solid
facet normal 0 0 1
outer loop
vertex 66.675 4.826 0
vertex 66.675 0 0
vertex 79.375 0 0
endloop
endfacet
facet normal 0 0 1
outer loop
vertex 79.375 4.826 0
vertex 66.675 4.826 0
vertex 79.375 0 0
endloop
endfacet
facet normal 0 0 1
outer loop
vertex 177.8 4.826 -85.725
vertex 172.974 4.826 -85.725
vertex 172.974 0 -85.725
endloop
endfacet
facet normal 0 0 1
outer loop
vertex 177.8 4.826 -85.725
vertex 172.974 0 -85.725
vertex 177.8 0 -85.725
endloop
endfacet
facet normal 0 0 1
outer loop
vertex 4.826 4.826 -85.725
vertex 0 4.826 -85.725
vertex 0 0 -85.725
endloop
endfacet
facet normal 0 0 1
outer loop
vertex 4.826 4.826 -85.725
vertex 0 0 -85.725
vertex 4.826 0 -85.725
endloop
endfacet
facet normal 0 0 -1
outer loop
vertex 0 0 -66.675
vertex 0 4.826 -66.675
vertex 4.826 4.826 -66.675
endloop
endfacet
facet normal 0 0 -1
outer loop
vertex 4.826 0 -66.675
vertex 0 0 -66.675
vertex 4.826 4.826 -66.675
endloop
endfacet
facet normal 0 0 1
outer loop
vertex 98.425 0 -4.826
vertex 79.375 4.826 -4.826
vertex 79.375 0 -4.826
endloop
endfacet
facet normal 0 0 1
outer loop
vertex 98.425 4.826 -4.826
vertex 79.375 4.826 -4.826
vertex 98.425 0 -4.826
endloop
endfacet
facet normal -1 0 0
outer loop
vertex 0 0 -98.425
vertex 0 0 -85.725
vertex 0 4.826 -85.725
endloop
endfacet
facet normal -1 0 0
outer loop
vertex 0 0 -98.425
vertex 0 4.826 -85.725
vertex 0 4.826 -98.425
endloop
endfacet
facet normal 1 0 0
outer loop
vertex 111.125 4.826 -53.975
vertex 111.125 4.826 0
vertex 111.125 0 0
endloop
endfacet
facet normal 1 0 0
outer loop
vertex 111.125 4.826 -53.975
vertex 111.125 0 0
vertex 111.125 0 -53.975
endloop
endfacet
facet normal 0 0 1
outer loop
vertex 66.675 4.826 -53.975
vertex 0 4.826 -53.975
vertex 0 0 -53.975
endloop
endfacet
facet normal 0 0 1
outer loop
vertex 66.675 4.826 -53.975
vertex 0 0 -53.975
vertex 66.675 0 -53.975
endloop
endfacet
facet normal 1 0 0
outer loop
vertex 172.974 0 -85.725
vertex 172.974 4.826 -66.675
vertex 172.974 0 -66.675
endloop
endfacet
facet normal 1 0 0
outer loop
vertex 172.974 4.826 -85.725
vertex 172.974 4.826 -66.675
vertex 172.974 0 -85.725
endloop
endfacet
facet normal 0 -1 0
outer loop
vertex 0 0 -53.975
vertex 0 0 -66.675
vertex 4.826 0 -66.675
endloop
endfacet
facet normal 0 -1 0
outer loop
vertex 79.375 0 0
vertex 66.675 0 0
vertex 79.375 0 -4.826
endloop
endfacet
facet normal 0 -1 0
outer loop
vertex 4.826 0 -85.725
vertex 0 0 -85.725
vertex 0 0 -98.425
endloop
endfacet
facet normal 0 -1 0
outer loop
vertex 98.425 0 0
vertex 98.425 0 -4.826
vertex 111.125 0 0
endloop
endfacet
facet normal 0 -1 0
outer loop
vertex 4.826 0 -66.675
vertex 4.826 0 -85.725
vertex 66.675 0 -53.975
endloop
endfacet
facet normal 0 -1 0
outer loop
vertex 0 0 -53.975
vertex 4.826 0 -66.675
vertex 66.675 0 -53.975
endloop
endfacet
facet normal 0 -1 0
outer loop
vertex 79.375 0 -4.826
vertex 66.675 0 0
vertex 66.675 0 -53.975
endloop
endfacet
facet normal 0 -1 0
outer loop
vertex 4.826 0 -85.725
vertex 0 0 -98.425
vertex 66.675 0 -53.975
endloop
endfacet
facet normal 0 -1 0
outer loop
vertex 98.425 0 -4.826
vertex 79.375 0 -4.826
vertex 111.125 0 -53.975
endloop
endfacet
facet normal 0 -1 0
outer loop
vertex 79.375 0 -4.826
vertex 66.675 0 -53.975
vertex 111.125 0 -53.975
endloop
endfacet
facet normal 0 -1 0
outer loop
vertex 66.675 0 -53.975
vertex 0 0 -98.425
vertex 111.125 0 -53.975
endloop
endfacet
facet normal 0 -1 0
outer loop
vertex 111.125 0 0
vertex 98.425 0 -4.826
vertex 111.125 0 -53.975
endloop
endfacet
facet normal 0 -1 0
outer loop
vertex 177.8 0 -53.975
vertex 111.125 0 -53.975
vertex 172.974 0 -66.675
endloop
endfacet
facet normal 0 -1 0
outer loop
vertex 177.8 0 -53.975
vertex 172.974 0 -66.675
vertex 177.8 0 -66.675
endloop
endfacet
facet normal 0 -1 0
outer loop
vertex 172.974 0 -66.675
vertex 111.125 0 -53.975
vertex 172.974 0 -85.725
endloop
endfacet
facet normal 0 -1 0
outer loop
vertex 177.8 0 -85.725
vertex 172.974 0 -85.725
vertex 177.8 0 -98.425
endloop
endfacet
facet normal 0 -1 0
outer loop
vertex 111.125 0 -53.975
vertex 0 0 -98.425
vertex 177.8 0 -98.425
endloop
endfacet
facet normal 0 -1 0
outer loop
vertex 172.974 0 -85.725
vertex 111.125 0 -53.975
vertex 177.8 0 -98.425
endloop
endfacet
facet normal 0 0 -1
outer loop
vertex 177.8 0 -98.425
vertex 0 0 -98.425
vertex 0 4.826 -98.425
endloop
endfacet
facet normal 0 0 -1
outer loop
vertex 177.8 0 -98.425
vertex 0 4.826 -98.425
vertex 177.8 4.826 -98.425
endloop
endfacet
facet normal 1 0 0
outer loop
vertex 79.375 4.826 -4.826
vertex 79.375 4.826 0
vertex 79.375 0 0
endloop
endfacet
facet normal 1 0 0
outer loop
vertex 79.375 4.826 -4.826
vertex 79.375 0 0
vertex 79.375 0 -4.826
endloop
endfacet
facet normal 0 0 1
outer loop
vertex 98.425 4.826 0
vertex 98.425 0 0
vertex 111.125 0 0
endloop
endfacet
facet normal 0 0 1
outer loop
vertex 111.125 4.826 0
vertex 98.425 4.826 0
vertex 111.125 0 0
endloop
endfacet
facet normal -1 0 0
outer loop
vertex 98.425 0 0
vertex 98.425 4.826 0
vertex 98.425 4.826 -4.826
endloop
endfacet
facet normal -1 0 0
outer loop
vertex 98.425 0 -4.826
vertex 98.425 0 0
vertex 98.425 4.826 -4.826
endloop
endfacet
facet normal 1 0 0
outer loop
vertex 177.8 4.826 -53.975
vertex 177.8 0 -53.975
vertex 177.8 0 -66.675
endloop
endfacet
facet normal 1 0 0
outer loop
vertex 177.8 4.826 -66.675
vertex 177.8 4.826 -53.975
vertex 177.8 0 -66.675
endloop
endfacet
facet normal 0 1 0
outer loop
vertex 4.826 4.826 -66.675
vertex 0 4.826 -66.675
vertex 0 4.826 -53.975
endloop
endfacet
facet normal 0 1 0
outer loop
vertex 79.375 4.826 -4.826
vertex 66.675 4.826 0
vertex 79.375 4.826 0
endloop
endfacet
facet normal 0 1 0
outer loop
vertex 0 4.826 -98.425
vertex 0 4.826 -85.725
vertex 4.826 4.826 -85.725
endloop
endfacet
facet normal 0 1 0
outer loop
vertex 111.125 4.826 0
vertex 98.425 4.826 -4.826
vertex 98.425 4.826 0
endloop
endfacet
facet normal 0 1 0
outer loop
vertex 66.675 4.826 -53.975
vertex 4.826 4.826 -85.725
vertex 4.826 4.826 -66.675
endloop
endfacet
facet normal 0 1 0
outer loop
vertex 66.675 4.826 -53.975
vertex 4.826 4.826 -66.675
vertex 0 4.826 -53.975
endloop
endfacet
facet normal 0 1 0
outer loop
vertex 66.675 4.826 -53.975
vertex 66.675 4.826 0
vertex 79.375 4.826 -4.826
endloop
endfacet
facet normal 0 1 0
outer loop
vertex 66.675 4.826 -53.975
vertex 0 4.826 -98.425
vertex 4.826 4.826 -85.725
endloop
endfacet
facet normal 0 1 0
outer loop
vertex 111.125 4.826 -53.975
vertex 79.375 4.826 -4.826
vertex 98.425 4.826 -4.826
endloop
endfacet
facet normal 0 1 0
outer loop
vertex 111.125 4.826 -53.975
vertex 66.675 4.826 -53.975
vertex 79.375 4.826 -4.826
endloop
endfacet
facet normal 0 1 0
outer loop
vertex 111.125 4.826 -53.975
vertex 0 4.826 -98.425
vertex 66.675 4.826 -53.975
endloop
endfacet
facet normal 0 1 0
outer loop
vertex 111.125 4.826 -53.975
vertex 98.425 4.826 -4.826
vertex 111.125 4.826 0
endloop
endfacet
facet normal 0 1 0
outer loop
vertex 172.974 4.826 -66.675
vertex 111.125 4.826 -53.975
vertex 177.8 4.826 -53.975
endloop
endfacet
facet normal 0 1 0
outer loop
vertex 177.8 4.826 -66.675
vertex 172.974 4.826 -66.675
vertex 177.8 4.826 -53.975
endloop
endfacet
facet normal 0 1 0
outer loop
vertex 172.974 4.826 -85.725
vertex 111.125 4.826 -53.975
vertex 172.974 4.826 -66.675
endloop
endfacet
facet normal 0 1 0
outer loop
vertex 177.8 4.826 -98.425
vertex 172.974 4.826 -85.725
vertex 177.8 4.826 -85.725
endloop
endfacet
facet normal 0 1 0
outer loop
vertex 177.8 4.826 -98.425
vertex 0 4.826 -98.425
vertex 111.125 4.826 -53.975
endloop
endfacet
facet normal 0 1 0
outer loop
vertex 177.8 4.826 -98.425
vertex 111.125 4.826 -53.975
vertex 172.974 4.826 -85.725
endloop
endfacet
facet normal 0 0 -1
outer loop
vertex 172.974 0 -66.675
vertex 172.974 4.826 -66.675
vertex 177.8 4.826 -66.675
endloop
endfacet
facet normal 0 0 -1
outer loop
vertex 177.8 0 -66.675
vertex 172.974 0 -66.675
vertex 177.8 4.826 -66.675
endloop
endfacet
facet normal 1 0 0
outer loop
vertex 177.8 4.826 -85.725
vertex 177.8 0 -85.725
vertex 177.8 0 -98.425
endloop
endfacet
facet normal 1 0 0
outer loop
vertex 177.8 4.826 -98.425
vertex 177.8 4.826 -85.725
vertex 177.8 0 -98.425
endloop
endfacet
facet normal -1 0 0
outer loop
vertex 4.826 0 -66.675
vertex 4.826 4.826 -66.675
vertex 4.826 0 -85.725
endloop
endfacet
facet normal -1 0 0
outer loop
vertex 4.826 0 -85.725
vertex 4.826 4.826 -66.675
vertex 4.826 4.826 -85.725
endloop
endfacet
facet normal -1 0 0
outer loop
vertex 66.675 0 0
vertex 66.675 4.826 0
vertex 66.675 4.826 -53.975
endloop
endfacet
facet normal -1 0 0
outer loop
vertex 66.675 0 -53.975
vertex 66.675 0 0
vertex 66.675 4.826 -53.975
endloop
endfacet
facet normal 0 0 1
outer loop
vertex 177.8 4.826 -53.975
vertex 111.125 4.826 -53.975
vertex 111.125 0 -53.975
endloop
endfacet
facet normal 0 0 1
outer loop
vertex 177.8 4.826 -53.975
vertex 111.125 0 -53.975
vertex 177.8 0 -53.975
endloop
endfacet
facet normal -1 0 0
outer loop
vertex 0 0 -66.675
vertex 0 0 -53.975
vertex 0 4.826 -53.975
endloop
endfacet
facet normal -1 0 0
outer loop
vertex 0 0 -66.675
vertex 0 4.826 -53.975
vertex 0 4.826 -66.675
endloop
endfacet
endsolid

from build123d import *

# Parameters (mm, degrees)
SKETCH1_W           = 177.8
SKETCH1_H           = 98.425
BOSS_EXTRUDE1_DEPTH = 4.826
SKETCH2_W           = 4.826
SKETCH2_H           = 19.05
SKETCH2_W_2         = 19.05
SKETCH2_H_2         = 4.826
ALL_SLOTS_DEPTH     = 204.282096853
SKETCH3_W           = 66.675
SKETCH3_H           = 53.975
CUT_EXTRUDE2_DEPTH  = 204.282096853


with BuildPart() as part:
    # Sketch1 → Boss-Extrude1 (new body)
    with BuildSketch(Plane(origin=(0, 0, 0), x_dir=(1, 0, 0), z_dir=(0, 1, 0))):
        with Locations((88.9, 49.2125)):
            Rectangle(SKETCH1_W, SKETCH1_H)
    extrude(amount=BOSS_EXTRUDE1_DEPTH)

    # Sketch2 → All Slots (cut, through all)
    with BuildSketch(Plane(origin=(0, 4.826, 0), x_dir=(1, 0, 0), z_dir=(0, 1, 0))):
        with Locations((2.413, 76.2)):
            Rectangle(SKETCH2_W, SKETCH2_H)
        with Locations((175.387, 76.2)):
            Rectangle(SKETCH2_W, SKETCH2_H)
        with Locations((88.9, 2.413)):
            Rectangle(SKETCH2_W_2, SKETCH2_H_2)
    extrude(amount=-ALL_SLOTS_DEPTH, mode=Mode.SUBTRACT)

    # Sketch3 → Cut-Extrude2 (cut, through all)
    with BuildSketch(Plane(origin=(0, 4.826, 0), x_dir=(1, 0, 0), z_dir=(0, 1, 0))):
        with Locations((33.3375, 26.9875)):
            Rectangle(SKETCH3_W, SKETCH3_H)
        with Locations((144.4625, 26.9875)):
            Rectangle(SKETCH3_W, SKETCH3_H)
    extrude(amount=-CUT_EXTRUDE2_DEPTH, mode=Mode.SUBTRACT)


solid = part.part
